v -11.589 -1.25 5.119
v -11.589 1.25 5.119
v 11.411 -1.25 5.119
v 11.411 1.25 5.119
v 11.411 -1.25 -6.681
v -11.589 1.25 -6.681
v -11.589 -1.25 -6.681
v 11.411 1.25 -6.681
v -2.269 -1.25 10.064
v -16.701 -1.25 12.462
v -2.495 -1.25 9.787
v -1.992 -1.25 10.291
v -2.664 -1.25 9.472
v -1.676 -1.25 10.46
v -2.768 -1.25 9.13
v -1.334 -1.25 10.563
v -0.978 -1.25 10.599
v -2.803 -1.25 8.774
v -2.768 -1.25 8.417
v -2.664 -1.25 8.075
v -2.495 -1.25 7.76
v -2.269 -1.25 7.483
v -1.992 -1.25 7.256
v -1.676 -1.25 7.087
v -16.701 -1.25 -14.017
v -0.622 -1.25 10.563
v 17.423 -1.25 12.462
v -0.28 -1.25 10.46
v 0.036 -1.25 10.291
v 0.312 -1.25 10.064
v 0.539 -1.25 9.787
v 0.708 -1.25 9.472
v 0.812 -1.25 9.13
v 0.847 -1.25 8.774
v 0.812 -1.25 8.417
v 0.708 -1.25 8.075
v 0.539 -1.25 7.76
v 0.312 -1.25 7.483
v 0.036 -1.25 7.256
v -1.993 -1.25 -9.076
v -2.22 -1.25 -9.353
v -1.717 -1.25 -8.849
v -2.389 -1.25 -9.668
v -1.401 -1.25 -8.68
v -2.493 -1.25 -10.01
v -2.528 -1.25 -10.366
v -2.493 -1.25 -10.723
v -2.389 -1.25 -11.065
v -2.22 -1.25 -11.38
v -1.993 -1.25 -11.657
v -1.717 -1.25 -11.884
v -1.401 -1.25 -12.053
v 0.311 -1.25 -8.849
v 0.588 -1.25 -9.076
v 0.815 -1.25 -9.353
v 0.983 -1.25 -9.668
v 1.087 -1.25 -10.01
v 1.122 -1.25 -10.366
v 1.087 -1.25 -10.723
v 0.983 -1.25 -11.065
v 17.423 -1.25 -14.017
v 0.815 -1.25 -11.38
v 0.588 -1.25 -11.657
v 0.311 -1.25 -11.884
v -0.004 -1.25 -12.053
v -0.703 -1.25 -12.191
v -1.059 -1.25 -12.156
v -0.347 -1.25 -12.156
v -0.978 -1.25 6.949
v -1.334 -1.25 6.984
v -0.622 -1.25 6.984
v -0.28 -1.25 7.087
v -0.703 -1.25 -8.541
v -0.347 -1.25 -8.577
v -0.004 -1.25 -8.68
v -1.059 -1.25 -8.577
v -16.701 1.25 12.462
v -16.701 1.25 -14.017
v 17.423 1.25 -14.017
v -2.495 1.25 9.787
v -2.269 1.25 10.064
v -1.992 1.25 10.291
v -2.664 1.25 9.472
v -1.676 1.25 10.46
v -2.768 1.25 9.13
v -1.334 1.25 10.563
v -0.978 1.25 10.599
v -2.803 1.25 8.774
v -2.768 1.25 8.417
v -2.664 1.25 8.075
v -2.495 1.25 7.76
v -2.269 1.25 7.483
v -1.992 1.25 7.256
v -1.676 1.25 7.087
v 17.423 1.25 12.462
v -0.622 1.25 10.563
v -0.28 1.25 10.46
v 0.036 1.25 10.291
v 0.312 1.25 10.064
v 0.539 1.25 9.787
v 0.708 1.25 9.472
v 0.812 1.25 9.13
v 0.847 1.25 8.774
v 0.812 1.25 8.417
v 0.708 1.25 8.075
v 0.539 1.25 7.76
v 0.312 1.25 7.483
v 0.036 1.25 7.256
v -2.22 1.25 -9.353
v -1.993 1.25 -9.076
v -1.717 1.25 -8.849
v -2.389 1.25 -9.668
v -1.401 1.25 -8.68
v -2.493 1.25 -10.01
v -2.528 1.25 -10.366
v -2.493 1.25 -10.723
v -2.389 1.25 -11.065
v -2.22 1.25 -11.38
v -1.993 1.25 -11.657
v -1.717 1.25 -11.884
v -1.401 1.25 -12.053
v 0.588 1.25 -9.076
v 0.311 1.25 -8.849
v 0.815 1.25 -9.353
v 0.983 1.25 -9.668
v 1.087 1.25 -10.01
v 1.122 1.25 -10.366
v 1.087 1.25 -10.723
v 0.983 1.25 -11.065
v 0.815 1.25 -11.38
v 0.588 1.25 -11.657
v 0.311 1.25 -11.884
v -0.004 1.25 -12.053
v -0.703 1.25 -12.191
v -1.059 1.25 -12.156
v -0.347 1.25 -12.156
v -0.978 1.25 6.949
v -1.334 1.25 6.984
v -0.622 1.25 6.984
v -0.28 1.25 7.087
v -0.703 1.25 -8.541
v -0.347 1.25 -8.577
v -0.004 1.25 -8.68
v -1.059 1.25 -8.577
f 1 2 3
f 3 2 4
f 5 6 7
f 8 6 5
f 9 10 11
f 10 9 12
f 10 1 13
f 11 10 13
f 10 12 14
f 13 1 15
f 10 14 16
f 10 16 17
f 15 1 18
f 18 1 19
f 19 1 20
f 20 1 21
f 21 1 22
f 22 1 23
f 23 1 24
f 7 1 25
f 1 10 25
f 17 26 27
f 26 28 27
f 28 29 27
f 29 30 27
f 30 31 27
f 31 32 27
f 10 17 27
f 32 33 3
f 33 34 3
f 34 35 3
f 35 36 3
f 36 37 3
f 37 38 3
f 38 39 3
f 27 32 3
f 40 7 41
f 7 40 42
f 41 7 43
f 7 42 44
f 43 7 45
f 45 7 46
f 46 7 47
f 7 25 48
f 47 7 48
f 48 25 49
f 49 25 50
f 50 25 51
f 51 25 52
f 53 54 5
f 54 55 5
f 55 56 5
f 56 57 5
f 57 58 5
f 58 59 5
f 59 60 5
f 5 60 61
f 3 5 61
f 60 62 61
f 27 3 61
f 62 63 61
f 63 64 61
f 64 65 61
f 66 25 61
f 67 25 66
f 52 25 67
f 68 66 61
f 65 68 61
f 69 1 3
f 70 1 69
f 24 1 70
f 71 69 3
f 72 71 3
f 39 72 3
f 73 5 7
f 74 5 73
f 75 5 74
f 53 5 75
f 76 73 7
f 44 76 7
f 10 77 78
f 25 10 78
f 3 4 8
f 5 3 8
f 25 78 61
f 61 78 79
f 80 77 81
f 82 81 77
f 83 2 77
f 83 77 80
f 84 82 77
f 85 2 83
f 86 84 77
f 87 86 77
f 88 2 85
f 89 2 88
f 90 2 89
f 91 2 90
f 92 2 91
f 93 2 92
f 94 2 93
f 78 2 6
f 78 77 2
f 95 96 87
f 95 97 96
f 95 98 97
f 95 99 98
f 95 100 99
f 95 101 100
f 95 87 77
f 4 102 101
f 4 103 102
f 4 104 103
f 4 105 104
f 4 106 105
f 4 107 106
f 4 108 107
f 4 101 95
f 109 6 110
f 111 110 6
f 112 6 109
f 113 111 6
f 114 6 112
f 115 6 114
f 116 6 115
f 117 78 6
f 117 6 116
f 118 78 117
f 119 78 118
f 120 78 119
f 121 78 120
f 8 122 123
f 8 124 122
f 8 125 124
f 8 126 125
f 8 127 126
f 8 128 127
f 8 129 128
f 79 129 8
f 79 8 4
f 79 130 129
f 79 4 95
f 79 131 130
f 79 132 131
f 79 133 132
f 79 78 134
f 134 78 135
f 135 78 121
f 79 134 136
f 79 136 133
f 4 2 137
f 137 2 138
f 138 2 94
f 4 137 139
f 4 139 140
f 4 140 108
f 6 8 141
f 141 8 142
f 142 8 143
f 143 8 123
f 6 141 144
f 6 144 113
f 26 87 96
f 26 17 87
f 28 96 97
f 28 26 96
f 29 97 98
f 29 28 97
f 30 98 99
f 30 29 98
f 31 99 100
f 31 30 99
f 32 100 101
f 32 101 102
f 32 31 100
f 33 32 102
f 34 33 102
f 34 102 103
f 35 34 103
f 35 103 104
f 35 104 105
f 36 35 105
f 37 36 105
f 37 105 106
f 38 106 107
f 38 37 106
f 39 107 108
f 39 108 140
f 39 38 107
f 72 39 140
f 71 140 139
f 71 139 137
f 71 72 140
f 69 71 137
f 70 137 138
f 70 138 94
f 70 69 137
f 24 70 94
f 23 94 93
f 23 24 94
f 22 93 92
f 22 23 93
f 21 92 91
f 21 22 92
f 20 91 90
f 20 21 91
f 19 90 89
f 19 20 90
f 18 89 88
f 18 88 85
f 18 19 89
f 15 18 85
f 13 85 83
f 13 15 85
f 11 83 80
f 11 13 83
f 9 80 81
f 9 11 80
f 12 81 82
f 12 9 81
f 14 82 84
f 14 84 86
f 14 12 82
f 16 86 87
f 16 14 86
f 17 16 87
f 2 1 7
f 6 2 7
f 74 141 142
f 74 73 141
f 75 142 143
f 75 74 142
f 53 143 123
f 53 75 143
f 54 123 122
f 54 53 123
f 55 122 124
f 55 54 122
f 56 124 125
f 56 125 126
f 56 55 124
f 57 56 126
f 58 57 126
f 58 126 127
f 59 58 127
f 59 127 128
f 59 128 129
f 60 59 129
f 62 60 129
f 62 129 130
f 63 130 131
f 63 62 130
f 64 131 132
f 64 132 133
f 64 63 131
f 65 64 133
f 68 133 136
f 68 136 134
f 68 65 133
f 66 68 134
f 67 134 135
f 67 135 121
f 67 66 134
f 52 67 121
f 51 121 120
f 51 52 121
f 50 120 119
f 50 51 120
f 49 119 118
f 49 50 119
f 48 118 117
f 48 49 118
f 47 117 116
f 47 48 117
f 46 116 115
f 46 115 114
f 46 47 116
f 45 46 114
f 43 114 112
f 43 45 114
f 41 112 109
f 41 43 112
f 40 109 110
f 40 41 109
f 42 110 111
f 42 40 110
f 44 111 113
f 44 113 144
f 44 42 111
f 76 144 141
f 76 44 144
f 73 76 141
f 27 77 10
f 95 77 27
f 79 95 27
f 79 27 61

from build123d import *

# Parameters (mm, degrees)
SKETCH2_W           = 34.12443
SKETCH2_H           = 26.478152769
SKETCH2_R           = 1.825
SKETCH2_W_2         = 23
SKETCH2_H_2         = 11.79979
BOSS_EXTRUDE1_DEPTH = 1.25


with BuildPart() as part:
    # Sketch2 → Boss-Extrude1 (new, symmetric)
    with BuildSketch(Plane(origin=(0, 0, 0), x_dir=(1, 0, 0), z_dir=(0, 1, 0))):
        with Locations((0.360723362, 0.777502601)):
            Rectangle(SKETCH2_W, SKETCH2_H)
        with Locations(Location((-0.702610465, 10.366481865, 0), (0, 0, 270))):
            Circle(SKETCH2_R, mode=Mode.SUBTRACT)
        with Locations(Location((-0.97805, -8.773518135, 0), (0, 0, 270))):
            Circle(SKETCH2_R, mode=Mode.SUBTRACT)
        with Locations((-0.088760873, 0.7809876)):
            Rectangle(SKETCH2_W_2, SKETCH2_H_2, mode=Mode.SUBTRACT)
    extrude(amount=BOSS_EXTRUDE1_DEPTH, both=True)


solid = part.part
